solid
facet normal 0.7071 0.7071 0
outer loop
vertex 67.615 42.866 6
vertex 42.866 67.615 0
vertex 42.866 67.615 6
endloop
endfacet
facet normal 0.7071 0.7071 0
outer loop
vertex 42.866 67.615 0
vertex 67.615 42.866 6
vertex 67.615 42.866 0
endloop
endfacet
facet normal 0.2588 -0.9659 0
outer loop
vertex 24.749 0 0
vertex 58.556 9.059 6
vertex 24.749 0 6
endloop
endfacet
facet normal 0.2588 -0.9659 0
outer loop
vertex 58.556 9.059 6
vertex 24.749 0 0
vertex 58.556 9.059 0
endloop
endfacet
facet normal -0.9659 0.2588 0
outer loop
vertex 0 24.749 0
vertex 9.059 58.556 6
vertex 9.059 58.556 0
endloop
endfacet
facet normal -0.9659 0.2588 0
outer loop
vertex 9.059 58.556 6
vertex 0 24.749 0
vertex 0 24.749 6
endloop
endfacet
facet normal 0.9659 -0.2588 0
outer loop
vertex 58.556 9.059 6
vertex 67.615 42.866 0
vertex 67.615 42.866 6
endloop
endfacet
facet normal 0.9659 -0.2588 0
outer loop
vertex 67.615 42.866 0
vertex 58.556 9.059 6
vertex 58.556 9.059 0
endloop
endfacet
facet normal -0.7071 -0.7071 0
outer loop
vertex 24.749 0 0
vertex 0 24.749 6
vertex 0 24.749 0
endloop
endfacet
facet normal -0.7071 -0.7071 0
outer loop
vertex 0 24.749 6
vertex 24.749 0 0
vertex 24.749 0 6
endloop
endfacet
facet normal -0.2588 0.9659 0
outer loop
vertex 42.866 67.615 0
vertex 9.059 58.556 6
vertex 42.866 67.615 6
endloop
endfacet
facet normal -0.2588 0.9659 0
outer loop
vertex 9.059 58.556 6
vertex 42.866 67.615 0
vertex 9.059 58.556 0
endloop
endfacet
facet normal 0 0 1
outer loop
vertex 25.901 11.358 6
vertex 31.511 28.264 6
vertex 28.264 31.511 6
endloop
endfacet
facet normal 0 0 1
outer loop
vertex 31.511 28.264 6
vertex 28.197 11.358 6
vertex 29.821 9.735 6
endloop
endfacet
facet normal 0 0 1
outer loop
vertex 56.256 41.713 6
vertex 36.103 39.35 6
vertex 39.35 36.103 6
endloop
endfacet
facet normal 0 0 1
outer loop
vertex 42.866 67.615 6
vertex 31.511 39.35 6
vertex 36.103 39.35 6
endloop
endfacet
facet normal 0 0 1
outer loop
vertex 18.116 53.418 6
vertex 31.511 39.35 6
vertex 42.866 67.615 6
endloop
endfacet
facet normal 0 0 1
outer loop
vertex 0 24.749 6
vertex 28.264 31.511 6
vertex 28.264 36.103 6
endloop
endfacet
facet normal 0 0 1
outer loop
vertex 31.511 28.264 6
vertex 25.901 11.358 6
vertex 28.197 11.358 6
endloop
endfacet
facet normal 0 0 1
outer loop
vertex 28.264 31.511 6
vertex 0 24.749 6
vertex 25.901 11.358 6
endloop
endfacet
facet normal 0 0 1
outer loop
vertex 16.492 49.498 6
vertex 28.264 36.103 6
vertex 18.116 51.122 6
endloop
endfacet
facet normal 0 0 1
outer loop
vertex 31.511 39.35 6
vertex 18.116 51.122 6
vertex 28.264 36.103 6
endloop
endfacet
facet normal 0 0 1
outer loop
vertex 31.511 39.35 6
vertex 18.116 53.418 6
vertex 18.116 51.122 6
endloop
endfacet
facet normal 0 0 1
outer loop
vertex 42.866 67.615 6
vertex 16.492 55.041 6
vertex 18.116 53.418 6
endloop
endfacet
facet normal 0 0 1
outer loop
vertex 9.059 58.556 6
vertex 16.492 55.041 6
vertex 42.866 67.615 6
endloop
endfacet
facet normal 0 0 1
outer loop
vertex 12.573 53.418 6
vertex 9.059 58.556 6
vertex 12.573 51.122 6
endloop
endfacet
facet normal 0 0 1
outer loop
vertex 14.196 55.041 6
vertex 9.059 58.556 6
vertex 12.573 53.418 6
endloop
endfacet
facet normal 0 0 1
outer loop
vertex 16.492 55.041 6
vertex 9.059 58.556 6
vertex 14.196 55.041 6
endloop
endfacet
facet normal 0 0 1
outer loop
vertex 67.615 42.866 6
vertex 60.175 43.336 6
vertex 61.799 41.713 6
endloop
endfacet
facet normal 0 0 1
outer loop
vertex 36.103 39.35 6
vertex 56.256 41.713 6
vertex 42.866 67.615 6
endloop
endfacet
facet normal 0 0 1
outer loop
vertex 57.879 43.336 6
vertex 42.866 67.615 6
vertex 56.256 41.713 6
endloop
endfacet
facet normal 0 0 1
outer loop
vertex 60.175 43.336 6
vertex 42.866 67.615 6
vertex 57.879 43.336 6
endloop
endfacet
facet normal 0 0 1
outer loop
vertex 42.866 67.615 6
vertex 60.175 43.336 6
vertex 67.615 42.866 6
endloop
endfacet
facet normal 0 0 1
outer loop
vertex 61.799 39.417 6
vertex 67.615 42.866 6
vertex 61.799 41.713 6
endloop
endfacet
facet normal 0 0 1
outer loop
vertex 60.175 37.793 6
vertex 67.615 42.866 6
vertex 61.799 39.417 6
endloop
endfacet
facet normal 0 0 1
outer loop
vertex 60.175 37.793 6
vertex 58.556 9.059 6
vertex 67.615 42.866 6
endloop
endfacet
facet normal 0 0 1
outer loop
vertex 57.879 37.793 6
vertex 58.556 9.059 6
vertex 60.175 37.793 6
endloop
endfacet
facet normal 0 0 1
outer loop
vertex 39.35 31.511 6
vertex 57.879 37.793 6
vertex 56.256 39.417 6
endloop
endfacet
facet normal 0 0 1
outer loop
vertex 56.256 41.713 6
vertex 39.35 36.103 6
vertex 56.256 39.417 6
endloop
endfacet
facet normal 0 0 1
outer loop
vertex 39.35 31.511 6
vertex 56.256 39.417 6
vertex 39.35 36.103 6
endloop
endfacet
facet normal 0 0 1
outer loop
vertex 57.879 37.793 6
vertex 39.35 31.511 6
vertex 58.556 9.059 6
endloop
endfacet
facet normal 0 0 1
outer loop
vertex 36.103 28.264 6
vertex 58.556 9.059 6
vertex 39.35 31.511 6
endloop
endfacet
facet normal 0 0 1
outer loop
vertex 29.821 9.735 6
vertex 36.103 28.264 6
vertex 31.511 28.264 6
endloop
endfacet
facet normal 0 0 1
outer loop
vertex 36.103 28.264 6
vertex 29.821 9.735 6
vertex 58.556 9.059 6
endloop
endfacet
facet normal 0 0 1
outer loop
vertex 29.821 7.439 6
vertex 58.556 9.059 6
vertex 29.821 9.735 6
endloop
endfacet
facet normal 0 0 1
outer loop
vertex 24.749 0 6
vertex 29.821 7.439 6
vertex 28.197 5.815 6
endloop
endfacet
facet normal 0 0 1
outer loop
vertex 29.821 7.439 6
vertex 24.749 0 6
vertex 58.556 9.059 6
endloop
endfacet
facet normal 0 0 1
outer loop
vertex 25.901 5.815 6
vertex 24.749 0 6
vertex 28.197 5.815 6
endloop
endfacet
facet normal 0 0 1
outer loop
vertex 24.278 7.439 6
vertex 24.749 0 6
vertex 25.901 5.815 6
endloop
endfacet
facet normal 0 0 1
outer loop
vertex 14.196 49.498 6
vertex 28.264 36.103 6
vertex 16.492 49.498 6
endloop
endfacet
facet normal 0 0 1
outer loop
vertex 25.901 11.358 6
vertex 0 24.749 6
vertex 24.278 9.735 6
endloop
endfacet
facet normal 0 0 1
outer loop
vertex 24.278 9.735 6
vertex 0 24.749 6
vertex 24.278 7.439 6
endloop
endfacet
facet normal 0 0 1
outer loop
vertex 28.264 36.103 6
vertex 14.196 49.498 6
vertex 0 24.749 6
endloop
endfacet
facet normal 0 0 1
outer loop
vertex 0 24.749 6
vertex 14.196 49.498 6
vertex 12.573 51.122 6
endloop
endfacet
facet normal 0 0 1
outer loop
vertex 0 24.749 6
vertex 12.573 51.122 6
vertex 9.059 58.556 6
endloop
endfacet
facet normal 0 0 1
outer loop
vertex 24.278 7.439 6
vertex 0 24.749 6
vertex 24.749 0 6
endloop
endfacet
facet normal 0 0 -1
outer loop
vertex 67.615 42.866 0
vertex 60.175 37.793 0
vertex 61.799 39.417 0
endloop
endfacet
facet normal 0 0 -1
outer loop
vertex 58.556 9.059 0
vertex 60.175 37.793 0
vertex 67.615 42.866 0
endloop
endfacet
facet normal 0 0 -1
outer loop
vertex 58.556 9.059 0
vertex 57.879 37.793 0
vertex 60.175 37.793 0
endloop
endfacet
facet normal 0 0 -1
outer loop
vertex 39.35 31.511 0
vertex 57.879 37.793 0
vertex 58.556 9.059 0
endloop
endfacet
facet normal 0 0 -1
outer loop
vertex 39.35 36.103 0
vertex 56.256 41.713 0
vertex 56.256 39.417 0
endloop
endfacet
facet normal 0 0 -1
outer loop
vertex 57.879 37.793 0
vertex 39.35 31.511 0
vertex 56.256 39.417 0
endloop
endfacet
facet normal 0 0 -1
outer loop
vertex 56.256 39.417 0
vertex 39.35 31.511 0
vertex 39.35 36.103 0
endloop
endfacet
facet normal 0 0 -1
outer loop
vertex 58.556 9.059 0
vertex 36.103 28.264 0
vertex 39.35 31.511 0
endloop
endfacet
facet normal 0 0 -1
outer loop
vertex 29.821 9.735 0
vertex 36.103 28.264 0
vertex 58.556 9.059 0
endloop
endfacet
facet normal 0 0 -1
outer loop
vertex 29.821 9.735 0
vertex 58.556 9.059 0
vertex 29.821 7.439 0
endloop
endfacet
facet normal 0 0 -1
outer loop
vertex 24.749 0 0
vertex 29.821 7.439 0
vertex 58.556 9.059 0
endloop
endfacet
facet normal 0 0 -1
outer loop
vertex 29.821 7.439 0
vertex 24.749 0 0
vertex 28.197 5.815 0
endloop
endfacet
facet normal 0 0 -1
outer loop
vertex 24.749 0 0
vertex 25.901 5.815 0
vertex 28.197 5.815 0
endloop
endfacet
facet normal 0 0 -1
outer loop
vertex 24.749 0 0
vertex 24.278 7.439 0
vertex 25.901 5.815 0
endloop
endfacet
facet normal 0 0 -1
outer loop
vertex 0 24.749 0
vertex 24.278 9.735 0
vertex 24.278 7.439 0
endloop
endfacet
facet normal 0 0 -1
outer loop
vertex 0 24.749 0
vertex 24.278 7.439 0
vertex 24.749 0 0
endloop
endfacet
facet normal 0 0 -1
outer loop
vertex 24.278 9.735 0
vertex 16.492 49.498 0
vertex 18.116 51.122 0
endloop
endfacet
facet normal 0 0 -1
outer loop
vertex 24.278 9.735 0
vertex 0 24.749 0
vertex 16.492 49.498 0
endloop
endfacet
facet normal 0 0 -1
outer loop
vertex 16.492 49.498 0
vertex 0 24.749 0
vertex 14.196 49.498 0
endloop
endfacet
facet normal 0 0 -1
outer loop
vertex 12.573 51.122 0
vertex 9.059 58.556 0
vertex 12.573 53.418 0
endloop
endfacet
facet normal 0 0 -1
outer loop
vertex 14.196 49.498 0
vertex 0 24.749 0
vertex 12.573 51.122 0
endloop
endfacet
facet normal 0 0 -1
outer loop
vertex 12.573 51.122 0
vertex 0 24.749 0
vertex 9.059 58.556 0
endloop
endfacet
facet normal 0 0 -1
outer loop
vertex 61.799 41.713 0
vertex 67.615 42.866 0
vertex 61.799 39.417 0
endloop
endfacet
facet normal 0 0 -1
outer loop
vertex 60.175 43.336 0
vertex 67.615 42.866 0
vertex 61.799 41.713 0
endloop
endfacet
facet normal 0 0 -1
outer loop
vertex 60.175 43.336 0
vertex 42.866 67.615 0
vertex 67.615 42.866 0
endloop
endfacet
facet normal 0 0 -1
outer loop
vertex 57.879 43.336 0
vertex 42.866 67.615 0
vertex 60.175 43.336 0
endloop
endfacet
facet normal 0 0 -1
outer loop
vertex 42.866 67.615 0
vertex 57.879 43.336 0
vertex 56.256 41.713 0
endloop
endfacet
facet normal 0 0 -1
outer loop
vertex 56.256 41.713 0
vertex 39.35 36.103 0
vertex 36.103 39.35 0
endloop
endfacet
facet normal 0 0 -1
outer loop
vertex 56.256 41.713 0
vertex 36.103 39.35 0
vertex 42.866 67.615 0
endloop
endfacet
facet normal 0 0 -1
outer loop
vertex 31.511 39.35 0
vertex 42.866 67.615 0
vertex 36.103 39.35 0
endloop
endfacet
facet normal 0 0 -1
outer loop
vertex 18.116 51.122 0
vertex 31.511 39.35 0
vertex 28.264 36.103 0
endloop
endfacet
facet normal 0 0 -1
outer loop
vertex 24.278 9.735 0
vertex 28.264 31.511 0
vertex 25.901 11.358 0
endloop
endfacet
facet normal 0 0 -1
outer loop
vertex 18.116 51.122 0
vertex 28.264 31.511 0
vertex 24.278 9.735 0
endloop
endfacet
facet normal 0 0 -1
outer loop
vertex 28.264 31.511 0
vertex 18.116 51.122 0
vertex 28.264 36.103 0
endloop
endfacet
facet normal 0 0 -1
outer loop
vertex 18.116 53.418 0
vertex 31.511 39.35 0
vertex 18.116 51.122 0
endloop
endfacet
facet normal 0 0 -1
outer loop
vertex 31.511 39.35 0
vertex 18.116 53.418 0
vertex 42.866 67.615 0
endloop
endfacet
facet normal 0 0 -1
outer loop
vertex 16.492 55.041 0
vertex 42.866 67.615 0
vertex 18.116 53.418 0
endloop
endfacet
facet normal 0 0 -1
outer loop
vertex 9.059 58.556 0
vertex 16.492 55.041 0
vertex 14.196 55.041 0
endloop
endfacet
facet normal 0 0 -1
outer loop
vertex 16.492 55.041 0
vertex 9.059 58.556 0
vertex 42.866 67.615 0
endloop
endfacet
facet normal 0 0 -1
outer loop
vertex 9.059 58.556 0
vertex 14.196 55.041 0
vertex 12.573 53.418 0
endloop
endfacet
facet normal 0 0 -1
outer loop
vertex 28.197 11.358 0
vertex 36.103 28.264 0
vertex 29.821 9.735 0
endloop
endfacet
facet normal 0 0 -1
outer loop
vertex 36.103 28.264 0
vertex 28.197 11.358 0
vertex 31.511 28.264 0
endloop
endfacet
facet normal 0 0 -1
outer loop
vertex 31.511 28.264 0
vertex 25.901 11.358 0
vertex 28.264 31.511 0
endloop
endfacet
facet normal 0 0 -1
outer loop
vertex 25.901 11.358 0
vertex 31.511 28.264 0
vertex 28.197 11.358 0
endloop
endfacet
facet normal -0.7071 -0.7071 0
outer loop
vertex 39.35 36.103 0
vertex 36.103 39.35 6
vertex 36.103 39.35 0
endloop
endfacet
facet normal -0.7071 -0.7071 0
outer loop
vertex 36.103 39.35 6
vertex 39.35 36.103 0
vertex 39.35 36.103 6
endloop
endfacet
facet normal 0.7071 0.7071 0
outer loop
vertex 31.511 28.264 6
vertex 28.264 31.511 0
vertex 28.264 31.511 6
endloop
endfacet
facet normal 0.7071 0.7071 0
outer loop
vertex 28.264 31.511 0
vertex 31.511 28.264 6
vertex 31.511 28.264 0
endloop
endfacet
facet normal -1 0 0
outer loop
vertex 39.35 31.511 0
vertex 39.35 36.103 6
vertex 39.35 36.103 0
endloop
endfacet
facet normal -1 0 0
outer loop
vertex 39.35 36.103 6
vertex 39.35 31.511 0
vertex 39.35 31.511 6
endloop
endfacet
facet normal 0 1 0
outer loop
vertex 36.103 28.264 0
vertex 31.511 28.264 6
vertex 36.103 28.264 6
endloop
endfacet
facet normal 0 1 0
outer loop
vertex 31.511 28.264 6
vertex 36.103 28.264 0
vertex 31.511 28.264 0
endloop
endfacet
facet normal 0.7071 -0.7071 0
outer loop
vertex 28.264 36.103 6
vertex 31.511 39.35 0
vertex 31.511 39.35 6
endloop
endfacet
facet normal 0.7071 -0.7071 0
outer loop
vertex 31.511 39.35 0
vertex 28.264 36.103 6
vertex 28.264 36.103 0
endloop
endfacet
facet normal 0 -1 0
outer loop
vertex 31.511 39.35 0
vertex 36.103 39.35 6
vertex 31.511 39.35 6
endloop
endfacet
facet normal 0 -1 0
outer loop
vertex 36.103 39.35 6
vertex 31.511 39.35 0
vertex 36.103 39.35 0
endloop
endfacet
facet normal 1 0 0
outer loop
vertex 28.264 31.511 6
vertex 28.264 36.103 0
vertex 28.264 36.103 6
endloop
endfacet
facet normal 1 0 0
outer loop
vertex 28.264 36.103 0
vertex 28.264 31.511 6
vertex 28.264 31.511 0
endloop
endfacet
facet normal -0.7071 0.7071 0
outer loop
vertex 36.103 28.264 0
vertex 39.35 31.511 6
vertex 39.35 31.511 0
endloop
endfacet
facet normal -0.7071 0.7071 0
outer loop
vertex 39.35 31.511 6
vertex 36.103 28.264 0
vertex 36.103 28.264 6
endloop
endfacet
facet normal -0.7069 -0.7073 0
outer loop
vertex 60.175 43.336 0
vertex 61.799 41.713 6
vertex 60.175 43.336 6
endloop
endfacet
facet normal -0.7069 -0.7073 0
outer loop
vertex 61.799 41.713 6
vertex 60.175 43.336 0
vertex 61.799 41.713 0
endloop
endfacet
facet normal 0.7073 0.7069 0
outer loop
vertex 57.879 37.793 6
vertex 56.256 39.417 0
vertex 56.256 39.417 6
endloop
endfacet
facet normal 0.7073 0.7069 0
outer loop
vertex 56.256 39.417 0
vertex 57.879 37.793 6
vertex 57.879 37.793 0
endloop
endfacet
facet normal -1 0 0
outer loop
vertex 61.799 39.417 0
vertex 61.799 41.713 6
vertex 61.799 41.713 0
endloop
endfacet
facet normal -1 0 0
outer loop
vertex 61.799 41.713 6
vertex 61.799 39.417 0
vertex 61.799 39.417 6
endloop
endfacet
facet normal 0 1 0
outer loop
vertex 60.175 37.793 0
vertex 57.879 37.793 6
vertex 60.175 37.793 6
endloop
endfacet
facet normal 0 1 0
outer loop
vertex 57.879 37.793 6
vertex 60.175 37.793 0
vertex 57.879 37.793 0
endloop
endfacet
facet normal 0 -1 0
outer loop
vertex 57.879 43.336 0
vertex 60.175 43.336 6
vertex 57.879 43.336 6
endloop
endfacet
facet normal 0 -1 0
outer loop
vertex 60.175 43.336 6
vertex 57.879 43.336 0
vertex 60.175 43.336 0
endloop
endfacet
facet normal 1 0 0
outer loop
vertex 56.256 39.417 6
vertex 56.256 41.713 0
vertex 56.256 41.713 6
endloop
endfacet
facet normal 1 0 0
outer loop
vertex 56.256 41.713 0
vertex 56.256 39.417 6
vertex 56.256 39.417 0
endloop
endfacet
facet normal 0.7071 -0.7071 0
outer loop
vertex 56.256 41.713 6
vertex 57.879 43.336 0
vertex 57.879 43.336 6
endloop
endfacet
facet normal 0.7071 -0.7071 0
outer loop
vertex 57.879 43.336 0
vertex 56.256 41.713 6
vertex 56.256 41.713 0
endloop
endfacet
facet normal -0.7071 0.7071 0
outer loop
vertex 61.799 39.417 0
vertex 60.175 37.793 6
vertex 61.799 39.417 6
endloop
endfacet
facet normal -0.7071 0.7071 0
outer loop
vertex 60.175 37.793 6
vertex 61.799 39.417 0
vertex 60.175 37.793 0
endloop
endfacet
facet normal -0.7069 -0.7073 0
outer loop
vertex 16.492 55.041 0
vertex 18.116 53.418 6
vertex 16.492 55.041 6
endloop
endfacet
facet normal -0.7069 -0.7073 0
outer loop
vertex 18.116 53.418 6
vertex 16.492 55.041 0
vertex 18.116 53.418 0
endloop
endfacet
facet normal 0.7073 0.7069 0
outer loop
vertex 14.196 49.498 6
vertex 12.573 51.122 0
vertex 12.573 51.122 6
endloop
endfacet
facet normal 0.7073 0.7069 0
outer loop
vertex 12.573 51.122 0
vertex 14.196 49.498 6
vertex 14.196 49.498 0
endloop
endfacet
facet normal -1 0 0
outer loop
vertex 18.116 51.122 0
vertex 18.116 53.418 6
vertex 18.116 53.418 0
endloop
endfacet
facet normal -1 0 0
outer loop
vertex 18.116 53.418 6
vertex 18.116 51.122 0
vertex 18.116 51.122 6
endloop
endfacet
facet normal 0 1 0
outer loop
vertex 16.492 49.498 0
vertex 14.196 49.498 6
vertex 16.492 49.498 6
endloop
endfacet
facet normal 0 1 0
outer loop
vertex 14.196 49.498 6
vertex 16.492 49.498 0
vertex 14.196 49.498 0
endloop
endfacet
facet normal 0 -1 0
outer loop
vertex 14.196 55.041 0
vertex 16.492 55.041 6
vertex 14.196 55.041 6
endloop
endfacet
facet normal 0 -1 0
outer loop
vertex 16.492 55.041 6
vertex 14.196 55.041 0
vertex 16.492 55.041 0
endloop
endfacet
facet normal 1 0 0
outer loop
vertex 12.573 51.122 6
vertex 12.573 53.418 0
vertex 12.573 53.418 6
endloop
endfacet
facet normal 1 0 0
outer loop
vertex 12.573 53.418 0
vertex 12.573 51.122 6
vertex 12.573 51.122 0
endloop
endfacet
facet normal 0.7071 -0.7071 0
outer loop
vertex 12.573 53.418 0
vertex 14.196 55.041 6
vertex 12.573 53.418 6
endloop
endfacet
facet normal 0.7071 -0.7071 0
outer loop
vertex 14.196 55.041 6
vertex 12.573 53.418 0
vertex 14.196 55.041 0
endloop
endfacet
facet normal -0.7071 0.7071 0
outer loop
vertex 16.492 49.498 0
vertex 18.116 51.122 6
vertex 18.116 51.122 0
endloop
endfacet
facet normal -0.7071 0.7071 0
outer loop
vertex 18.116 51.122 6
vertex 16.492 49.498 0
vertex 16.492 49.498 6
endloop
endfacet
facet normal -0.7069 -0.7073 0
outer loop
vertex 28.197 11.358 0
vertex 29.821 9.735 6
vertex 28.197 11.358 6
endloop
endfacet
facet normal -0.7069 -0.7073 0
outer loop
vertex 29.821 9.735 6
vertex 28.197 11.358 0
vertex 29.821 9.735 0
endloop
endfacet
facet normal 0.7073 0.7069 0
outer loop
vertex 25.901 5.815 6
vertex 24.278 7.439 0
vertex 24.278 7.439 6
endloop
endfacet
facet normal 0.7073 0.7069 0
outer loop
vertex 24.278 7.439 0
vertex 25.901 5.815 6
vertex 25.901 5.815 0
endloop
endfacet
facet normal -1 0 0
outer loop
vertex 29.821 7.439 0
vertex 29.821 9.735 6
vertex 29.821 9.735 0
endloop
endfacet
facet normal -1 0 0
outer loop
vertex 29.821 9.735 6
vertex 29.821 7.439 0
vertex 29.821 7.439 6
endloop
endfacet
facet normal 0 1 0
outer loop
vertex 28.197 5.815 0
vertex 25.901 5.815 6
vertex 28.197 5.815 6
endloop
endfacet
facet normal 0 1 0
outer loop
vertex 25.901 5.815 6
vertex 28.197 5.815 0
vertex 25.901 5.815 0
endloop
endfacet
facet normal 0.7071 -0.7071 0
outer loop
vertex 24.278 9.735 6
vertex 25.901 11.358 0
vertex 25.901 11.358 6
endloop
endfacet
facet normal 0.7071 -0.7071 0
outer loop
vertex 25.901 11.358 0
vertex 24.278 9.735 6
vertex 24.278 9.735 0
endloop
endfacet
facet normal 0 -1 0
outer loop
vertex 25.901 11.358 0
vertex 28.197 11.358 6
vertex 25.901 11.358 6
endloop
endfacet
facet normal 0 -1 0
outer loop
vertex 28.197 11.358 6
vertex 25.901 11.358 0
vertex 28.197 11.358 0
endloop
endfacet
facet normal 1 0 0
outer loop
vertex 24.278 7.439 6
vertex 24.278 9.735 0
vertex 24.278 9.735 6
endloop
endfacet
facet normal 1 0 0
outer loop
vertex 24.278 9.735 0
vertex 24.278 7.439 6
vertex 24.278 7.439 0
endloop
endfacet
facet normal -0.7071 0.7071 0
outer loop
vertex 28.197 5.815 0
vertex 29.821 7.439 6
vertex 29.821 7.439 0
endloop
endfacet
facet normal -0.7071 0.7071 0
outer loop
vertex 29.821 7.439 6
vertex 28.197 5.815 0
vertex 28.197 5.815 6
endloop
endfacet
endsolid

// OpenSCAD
$fn = 32;

// ----------------------------------------------------------------------
// Polygon plate: 6-gon R35, 3 bolt windows
// ----------------------------------------------------------------------

// --- parameters (mm) ---
sides = 6;                // number of polygon sides
plate_r = 35;             // circumscribed radius of the polygon
bore_r = 6;               // centre bore radius
bolts = 3;                // number of bolt windows
ring_r = 26.11;           // bolt-circle radius
bolt_r = 3;               // bolt window radius
plate_t = 6;              // plate thickness, Z (extrusion height)

plate_d = 2 * plate_r;  // circumscribed diameter
bore_d = 2 * bore_r;  // centre bore diameter
bolt_d = 2 * bolt_r;  // bolt window diameter
ring_d = 2 * ring_r;  // bolt-circle diameter

profile = [[67.615, 42.866], [42.866, 67.615], [9.059, 58.556], [0, 24.749], [24.749, 0], [58.556, 9.059]];  // primary outline, 6 points, counter clockwise
void_1 = [[39.35, 36.103], [36.103, 39.35], [31.511, 39.35], [28.264, 36.103], [28.264, 31.511], [31.511, 28.264], [36.103, 28.264], [39.35, 31.511]];  // centre bore, 8 points
void_2 = [[61.799, 41.713], [60.175, 43.336], [57.879, 43.336], [56.256, 41.713], [56.256, 39.417], [57.879, 37.793], [60.175, 37.793], [61.799, 39.417]];  // bolt window 1, 8 points
void_3 = [[18.116, 53.418], [16.492, 55.041], [14.196, 55.041], [12.573, 53.418], [12.573, 51.122], [14.196, 49.498], [16.492, 49.498], [18.116, 51.122]];  // bolt window 2, 8 points
void_4 = [[29.821, 9.735], [28.197, 11.358], [25.901, 11.358], [24.278, 9.735], [24.278, 7.439], [25.901, 5.815], [28.197, 5.815], [29.821, 7.439]];  // bolt window 3, 8 points

// --- the one profile operation ---
difference() {
  linear_extrude(height = plate_t) polygon(points = profile);
  translate([0, 0, -1])
    linear_extrude(height = plate_t + 2) polygon(points = void_1);
  translate([0, 0, -1])
    linear_extrude(height = plate_t + 2) polygon(points = void_2);
  translate([0, 0, -1])
    linear_extrude(height = plate_t + 2) polygon(points = void_3);
  translate([0, 0, -1])
    linear_extrude(height = plate_t + 2) polygon(points = void_4);
}
